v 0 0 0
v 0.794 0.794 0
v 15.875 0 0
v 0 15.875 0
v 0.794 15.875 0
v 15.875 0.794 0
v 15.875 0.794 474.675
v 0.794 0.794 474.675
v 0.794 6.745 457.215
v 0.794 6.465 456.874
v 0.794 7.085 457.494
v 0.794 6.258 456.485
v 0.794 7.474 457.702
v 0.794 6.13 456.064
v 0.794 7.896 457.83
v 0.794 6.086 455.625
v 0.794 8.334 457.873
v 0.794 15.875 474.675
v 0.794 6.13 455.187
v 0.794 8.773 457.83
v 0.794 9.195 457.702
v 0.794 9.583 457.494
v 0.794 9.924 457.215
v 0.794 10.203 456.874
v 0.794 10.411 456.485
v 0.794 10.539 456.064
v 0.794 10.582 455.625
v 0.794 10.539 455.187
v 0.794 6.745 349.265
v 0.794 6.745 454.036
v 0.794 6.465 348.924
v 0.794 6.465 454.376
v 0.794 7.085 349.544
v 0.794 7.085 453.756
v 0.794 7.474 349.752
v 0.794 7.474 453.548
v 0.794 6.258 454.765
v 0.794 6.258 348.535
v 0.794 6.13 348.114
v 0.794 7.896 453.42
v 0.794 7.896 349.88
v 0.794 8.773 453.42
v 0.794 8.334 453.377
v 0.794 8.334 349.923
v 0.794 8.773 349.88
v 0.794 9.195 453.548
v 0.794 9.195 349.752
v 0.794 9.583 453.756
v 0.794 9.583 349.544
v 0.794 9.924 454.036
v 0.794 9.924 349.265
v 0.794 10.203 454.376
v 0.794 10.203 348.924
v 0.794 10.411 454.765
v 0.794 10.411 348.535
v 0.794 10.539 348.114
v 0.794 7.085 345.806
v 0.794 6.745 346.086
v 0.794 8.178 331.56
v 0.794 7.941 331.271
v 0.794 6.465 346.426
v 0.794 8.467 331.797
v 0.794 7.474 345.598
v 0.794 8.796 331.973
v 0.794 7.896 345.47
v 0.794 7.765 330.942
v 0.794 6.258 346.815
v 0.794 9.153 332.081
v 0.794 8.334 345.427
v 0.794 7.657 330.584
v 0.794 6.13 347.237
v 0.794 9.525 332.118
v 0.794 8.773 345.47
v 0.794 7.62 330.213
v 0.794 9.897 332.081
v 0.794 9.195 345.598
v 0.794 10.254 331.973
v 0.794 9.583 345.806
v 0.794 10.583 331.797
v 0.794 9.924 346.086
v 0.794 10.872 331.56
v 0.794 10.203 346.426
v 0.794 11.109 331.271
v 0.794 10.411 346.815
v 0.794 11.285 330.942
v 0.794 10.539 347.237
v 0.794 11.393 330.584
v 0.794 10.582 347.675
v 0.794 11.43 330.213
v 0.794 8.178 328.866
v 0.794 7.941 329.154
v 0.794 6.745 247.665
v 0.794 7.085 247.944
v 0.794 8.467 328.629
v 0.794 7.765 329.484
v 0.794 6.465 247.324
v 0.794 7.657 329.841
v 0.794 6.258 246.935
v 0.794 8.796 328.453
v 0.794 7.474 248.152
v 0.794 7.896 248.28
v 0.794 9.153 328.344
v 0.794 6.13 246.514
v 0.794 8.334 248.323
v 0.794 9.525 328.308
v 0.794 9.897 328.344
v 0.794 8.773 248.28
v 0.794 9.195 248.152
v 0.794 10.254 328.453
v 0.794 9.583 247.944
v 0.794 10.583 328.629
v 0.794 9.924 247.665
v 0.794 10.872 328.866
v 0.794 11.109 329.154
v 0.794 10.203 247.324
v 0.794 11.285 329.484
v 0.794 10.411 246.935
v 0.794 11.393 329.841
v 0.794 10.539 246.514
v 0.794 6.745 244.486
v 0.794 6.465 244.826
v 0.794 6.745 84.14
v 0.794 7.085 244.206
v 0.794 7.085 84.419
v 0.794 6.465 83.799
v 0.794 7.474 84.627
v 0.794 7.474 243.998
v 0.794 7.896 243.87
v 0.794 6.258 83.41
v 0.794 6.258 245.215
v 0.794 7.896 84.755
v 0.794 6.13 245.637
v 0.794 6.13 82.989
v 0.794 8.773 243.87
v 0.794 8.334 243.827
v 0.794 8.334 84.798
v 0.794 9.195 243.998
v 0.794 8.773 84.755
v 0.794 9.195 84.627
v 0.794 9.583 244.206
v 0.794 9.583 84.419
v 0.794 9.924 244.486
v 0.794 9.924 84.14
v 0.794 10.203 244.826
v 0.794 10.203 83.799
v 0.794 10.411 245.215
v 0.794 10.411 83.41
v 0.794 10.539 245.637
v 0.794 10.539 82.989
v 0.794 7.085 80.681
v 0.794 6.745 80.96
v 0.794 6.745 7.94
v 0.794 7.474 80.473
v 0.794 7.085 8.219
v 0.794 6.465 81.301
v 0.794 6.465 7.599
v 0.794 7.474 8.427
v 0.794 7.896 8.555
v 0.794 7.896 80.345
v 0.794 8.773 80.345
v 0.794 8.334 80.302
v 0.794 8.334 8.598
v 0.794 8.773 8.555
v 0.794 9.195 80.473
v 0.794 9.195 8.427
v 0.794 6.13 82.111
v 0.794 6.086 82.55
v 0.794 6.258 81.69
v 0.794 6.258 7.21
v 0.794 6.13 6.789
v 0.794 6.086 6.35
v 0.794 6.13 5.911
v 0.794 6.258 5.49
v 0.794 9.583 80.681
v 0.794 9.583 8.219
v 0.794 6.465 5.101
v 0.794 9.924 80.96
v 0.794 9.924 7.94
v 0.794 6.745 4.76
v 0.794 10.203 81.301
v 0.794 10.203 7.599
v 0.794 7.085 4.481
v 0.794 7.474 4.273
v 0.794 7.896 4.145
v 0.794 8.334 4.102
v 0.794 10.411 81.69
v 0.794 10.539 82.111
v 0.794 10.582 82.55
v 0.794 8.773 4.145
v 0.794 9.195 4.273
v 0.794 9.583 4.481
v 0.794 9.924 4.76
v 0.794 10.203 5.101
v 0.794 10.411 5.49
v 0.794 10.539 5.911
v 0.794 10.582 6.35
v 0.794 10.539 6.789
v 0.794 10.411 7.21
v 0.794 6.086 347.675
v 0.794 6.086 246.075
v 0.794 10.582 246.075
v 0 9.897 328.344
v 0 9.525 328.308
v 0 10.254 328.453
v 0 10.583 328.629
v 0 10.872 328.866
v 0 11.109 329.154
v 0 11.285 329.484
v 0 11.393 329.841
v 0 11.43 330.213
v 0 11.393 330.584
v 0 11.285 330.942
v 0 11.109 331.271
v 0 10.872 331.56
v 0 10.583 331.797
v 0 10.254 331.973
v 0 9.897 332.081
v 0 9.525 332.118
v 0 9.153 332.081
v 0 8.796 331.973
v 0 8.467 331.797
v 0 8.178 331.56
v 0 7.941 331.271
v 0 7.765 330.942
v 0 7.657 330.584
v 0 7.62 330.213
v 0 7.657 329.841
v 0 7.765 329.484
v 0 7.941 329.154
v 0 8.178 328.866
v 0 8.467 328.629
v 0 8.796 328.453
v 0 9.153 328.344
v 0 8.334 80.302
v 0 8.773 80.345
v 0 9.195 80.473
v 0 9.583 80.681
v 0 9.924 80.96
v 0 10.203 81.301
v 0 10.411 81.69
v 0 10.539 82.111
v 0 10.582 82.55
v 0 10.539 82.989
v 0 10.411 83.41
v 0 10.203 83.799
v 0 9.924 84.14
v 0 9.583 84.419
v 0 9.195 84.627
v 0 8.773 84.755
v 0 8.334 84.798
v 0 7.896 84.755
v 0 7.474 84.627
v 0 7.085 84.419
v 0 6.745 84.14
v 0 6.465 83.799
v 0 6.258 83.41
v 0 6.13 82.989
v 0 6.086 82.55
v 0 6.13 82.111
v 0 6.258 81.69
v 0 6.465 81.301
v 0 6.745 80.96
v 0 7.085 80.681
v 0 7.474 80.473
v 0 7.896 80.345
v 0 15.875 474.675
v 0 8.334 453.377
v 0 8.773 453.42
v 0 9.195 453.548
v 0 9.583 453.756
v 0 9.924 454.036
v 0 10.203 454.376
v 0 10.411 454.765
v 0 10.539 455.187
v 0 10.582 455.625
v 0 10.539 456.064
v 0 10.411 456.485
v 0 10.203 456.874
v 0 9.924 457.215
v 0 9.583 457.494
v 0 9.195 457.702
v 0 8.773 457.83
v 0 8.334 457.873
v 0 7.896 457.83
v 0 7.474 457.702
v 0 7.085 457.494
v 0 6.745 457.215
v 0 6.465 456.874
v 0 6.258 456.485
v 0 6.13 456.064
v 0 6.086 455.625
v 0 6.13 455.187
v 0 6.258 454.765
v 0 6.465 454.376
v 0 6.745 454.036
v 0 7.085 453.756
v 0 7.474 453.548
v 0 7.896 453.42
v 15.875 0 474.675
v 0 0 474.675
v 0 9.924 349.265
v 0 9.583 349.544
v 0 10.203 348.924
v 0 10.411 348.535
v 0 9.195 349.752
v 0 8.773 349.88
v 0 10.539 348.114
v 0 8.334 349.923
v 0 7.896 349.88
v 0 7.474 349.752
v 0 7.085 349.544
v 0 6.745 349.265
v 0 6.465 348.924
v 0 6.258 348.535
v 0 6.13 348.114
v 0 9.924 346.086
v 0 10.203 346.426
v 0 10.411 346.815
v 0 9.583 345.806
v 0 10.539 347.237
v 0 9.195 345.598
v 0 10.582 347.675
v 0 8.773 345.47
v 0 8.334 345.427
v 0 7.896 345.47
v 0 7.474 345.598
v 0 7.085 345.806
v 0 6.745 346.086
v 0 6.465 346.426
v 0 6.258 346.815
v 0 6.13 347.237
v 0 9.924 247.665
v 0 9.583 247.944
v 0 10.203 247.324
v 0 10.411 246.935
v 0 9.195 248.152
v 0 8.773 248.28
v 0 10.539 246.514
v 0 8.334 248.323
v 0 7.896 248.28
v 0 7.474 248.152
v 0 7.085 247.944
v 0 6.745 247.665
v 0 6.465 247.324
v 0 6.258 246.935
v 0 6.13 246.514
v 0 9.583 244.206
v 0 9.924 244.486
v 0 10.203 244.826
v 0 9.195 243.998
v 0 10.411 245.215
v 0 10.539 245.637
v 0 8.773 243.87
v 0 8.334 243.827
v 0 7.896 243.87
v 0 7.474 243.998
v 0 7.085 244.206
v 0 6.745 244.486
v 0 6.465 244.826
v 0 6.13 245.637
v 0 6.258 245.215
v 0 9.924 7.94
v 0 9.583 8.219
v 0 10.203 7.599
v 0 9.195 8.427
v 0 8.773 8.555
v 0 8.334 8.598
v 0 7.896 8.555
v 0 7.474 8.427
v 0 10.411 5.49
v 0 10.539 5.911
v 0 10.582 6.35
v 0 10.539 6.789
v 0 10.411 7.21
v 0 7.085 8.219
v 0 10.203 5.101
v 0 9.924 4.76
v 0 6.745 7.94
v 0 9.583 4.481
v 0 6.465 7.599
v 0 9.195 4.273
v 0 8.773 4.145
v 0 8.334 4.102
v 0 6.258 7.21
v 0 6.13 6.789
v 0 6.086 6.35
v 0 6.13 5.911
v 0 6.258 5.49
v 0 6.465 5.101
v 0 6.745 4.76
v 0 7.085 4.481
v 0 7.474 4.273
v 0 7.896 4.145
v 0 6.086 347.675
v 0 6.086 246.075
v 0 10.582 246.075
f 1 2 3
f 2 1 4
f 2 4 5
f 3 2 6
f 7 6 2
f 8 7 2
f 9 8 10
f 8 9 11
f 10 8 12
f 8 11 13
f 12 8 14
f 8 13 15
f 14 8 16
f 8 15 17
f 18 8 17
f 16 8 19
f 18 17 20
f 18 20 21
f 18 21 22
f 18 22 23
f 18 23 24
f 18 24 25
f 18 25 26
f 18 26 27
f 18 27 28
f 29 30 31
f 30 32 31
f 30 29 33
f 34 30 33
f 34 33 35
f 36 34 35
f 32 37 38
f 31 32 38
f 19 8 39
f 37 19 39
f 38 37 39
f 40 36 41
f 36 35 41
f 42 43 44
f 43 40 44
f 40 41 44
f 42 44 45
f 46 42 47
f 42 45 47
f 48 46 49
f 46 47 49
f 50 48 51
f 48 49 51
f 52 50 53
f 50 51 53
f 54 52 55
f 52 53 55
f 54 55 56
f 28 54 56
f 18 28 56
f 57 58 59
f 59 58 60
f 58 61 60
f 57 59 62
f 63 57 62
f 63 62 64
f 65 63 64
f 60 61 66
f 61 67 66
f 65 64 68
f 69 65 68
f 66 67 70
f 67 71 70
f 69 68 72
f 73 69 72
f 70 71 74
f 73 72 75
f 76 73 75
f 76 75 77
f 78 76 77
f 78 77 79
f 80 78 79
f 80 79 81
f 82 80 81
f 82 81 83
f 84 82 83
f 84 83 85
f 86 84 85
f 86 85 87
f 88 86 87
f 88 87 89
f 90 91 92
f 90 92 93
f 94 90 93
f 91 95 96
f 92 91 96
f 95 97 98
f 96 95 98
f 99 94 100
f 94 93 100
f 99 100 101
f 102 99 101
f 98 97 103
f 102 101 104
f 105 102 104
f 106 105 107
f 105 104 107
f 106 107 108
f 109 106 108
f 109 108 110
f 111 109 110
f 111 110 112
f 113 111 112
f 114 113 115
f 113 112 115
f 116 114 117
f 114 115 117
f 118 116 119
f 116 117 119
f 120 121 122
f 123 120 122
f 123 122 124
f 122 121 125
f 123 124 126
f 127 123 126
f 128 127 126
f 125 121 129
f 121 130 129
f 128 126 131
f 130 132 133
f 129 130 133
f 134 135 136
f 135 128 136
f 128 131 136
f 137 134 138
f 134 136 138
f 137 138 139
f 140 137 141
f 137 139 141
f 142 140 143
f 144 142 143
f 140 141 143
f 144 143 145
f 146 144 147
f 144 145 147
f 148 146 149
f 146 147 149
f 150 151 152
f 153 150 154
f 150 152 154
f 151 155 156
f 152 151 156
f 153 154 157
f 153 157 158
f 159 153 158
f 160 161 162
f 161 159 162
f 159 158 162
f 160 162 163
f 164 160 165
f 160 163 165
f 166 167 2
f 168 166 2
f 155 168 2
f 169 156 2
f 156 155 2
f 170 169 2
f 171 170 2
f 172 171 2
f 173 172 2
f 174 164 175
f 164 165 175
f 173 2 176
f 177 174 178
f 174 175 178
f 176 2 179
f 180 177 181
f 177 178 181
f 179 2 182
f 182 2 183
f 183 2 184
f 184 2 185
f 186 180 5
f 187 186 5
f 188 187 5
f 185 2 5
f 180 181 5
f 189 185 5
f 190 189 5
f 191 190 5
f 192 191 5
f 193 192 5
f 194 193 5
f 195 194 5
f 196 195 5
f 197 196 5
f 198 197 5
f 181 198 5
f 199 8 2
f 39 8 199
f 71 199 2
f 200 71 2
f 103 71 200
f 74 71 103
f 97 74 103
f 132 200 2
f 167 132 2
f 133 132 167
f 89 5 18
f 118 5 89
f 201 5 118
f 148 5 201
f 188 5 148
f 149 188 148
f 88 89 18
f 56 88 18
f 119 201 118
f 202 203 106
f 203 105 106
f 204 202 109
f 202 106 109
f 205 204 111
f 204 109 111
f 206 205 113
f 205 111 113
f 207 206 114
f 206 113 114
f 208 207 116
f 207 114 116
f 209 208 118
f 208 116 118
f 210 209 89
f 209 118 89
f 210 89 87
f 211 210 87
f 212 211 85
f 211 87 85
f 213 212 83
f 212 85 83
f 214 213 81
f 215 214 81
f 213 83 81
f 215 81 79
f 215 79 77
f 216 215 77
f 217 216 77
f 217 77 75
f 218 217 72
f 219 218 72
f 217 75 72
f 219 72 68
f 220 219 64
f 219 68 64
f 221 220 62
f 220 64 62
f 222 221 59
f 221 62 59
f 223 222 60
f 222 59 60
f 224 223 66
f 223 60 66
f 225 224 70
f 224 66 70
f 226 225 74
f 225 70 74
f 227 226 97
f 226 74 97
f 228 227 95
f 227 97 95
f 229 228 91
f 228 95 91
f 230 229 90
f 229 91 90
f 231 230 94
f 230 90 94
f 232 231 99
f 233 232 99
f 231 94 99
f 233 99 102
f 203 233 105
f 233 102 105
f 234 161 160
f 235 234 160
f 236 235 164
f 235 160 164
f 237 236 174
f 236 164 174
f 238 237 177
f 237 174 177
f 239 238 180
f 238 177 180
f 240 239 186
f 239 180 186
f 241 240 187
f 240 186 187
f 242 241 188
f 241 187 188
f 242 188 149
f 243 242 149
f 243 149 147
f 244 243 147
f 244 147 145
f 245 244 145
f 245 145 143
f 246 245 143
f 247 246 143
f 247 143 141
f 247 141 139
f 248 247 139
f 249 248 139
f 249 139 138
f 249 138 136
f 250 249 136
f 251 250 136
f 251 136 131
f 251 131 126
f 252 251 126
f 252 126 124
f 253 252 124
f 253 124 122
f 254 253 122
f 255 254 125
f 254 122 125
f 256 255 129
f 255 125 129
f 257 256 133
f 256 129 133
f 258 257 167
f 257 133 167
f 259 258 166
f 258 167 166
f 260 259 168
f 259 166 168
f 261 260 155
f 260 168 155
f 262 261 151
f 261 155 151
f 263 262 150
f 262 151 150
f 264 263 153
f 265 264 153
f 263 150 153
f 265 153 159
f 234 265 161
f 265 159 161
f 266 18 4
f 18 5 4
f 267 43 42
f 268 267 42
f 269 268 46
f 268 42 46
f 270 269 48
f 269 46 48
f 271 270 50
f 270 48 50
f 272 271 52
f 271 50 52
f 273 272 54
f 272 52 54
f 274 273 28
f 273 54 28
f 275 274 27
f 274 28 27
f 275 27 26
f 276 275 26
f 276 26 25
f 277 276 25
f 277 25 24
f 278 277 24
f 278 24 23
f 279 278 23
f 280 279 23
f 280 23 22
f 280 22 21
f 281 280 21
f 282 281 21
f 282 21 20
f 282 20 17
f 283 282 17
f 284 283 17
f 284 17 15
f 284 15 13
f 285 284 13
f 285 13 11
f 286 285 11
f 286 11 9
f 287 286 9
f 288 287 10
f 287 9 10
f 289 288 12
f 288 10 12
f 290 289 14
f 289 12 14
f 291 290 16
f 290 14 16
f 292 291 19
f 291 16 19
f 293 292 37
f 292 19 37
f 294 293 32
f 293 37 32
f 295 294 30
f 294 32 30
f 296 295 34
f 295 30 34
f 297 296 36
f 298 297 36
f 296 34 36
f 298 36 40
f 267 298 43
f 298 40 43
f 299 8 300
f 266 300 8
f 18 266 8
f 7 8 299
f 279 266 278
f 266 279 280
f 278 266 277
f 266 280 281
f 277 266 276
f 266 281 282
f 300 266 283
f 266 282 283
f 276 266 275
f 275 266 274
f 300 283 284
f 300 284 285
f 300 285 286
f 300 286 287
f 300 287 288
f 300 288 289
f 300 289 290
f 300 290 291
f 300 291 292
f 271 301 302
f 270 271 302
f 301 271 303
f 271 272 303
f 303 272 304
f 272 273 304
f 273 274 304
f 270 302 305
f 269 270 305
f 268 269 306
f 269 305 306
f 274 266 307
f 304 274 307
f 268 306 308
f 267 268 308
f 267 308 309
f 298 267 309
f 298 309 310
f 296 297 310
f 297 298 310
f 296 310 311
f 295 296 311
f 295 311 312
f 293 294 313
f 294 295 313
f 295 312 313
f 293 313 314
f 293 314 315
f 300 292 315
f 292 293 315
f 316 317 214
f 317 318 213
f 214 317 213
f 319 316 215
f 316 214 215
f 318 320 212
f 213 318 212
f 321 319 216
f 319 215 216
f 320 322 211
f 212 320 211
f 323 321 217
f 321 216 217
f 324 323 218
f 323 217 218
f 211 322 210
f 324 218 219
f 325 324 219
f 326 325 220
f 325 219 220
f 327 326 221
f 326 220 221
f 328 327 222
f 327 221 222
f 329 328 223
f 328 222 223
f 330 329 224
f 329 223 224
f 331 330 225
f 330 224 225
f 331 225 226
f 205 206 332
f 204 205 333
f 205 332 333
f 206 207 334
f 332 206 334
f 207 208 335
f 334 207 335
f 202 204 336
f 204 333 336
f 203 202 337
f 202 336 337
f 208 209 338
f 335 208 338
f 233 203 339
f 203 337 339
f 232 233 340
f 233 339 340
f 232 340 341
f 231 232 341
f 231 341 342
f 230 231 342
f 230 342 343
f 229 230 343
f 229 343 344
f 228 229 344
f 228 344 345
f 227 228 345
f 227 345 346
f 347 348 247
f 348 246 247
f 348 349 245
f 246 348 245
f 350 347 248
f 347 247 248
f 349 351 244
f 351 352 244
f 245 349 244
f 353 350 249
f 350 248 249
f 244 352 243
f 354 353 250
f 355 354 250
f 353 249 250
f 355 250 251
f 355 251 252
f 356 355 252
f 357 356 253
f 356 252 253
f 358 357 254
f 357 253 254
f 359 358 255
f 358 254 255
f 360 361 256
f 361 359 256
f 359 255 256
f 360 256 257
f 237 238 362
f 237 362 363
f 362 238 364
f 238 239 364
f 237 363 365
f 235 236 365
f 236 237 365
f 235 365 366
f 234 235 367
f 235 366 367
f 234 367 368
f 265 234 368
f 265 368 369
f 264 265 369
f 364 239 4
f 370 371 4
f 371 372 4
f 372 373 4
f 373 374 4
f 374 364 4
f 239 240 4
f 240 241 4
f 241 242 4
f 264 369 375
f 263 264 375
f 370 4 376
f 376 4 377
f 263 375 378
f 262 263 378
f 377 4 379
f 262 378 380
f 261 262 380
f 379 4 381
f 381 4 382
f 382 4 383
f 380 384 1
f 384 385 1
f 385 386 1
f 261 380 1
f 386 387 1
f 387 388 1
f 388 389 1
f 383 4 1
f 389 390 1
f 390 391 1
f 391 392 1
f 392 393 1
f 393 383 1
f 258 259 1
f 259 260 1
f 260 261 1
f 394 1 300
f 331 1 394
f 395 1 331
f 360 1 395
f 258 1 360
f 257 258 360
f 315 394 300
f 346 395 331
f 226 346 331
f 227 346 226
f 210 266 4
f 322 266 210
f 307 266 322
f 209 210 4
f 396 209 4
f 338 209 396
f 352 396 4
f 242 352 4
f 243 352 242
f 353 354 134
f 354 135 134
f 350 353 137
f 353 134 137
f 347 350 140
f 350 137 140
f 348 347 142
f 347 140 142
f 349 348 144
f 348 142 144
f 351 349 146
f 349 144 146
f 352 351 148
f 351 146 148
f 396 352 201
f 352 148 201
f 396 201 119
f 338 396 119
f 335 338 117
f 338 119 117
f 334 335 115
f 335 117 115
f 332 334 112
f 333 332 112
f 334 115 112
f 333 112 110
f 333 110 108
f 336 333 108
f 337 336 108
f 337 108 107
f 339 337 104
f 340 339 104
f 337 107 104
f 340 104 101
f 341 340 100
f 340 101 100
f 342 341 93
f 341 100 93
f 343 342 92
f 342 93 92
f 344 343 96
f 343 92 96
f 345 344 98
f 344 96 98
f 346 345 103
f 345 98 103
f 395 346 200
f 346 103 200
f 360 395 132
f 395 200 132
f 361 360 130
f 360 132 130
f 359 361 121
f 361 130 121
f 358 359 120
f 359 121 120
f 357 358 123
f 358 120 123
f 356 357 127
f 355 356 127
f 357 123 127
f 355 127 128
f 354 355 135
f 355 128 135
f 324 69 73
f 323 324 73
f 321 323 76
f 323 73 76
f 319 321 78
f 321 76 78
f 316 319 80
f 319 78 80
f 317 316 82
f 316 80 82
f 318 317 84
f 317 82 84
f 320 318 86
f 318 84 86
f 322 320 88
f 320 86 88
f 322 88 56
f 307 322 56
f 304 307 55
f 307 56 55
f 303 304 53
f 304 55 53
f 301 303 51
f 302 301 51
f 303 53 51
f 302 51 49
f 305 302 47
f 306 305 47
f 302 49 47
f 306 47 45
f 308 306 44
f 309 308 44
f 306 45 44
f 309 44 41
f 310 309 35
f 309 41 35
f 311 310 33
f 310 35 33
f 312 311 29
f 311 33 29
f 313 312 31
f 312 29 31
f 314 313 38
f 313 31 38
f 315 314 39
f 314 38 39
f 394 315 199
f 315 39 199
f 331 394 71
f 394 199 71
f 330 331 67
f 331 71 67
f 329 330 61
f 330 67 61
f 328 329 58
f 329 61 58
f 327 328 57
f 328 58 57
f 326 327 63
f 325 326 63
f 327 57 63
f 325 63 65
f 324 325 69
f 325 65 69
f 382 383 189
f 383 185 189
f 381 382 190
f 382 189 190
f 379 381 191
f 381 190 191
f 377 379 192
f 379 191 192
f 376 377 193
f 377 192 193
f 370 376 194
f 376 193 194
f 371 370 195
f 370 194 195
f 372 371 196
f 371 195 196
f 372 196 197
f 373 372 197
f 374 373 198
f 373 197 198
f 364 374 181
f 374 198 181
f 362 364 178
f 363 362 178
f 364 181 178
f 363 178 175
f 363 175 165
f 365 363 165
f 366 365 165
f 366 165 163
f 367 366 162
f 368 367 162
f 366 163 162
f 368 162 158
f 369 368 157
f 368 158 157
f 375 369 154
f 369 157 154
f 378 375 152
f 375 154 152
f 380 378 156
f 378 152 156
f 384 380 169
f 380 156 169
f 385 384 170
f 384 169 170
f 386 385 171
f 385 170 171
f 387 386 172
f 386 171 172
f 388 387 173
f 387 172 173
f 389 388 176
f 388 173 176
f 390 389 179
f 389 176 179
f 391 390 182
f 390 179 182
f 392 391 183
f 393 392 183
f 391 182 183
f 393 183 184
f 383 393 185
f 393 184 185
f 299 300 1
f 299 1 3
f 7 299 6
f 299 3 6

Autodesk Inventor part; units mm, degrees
ref_plane "YZ Plane" through (0, 0, 0) normal (1, 0, 0) x (0, 1, 0)
ref_plane "XZ Plane" through (0, 0, 0) normal (0, 1, 0) x (-1, 0, 0)
ref_plane "XY Plane" through (0, 0, 0) normal (0, 0, 1) x (1, 0, 0)
sketch "Sketch1" plane through (0, 0, 0) normal (0, 0, 1) x (1, 0, 0)
  line L0 (0, 0) -> (15.875, 0)
  line L1 (15.875, 0) -> (15.875, 0.7937)
  line L2 (15.875, 0.7937) -> (0.7938, 0.7937)
  line L3 (0.7938, 0.7937) -> (0.7937, 15.875)
  line L4 (0.7937, 15.875) -> (0, 15.875)
  line L5 (0, 15.875) -> (0, 0)
  dimension "d0" = 15.875
  dimension "d1" = 0.7937
  dimension "d2" = 0.7937
extrude "Extrusion1" add sketch "Sketch1" along normal blind 474.6752
sketch "Sketch2" plane through (0.7937, 0.7937, 0) normal (1, 0, 0) x (0, 0, -1)
  line L0 (0, 0) -> (0, 15.0812) projected
  line L1 (-474.6752, 0) -> (-474.6752, 15.0812) projected
  line L2 (-474.6752, 7.5406) -> (0, 7.5406) construction
  circle A0 centre (-455.6252, 112.4267) radius 2.2479 construction
  circle A1 centre (-82.55, 112.4267) radius 2.2479 construction
  circle A2 centre (-63.5127, 112.4267) radius 2.2479 construction
  circle A3 centre (-19.0627, 112.4267) radius 2.2479 construction
  circle A4 centre (-6.35, 112.4267) radius 2.2479 construction
  circle A5 centre (-246.0752, 112.4267) radius 2.2479 construction
  circle A6 centre (-347.6752, 112.4267) radius 2.2479 construction
  line L3 (0, 104.8861) -> (0, 119.9674) construction
  line L4 (0, 119.9674) -> (-474.6752, 119.9674) construction
  line L5 (-474.6752, 104.8861) -> (-474.6752, 119.9674) construction
  line L6 (0, 104.8861) -> (-474.6752, 104.8861) construction
  circle A7 centre (-455.6252, 7.5406) radius 2.2479
  circle A8 centre (-347.6752, 7.5406) radius 2.2479
  circle A9 centre (-246.0752, 7.5406) radius 2.2479
  circle A10 centre (-82.55, 7.5406) radius 2.2479
  circle A11 centre (-6.35, 7.5406) radius 2.2479
  line L7 (-455.6252, 112.4267) -> (-455.6252, 7.5406) construction
  line L8 (-347.6752, 7.5406) -> (-347.6752, 112.4267) construction
  line L9 (-246.0752, 112.4267) -> (-246.0752, 7.5406) construction
  line L10 (-82.55, 112.4267) -> (-82.55, 7.5406) construction
  line L11 (-6.35, 7.5406) -> (-6.35, 112.4267) construction
  circle A12 centre (-330.2127, 8.7312) radius 1.905 projected
  circle A13 centre (-369.6843, 112.9728) radius 1.905 projected
  point P0 (0, -0.7937)
extrude "Extrusion2" cut sketch "Sketch2" against normal through all contours A7 | A8 | A9 | A10 | A11 | A12
properties part number "Electrical Board 1 Bracing L Channel Part 2" material "Aluminum 6061"
